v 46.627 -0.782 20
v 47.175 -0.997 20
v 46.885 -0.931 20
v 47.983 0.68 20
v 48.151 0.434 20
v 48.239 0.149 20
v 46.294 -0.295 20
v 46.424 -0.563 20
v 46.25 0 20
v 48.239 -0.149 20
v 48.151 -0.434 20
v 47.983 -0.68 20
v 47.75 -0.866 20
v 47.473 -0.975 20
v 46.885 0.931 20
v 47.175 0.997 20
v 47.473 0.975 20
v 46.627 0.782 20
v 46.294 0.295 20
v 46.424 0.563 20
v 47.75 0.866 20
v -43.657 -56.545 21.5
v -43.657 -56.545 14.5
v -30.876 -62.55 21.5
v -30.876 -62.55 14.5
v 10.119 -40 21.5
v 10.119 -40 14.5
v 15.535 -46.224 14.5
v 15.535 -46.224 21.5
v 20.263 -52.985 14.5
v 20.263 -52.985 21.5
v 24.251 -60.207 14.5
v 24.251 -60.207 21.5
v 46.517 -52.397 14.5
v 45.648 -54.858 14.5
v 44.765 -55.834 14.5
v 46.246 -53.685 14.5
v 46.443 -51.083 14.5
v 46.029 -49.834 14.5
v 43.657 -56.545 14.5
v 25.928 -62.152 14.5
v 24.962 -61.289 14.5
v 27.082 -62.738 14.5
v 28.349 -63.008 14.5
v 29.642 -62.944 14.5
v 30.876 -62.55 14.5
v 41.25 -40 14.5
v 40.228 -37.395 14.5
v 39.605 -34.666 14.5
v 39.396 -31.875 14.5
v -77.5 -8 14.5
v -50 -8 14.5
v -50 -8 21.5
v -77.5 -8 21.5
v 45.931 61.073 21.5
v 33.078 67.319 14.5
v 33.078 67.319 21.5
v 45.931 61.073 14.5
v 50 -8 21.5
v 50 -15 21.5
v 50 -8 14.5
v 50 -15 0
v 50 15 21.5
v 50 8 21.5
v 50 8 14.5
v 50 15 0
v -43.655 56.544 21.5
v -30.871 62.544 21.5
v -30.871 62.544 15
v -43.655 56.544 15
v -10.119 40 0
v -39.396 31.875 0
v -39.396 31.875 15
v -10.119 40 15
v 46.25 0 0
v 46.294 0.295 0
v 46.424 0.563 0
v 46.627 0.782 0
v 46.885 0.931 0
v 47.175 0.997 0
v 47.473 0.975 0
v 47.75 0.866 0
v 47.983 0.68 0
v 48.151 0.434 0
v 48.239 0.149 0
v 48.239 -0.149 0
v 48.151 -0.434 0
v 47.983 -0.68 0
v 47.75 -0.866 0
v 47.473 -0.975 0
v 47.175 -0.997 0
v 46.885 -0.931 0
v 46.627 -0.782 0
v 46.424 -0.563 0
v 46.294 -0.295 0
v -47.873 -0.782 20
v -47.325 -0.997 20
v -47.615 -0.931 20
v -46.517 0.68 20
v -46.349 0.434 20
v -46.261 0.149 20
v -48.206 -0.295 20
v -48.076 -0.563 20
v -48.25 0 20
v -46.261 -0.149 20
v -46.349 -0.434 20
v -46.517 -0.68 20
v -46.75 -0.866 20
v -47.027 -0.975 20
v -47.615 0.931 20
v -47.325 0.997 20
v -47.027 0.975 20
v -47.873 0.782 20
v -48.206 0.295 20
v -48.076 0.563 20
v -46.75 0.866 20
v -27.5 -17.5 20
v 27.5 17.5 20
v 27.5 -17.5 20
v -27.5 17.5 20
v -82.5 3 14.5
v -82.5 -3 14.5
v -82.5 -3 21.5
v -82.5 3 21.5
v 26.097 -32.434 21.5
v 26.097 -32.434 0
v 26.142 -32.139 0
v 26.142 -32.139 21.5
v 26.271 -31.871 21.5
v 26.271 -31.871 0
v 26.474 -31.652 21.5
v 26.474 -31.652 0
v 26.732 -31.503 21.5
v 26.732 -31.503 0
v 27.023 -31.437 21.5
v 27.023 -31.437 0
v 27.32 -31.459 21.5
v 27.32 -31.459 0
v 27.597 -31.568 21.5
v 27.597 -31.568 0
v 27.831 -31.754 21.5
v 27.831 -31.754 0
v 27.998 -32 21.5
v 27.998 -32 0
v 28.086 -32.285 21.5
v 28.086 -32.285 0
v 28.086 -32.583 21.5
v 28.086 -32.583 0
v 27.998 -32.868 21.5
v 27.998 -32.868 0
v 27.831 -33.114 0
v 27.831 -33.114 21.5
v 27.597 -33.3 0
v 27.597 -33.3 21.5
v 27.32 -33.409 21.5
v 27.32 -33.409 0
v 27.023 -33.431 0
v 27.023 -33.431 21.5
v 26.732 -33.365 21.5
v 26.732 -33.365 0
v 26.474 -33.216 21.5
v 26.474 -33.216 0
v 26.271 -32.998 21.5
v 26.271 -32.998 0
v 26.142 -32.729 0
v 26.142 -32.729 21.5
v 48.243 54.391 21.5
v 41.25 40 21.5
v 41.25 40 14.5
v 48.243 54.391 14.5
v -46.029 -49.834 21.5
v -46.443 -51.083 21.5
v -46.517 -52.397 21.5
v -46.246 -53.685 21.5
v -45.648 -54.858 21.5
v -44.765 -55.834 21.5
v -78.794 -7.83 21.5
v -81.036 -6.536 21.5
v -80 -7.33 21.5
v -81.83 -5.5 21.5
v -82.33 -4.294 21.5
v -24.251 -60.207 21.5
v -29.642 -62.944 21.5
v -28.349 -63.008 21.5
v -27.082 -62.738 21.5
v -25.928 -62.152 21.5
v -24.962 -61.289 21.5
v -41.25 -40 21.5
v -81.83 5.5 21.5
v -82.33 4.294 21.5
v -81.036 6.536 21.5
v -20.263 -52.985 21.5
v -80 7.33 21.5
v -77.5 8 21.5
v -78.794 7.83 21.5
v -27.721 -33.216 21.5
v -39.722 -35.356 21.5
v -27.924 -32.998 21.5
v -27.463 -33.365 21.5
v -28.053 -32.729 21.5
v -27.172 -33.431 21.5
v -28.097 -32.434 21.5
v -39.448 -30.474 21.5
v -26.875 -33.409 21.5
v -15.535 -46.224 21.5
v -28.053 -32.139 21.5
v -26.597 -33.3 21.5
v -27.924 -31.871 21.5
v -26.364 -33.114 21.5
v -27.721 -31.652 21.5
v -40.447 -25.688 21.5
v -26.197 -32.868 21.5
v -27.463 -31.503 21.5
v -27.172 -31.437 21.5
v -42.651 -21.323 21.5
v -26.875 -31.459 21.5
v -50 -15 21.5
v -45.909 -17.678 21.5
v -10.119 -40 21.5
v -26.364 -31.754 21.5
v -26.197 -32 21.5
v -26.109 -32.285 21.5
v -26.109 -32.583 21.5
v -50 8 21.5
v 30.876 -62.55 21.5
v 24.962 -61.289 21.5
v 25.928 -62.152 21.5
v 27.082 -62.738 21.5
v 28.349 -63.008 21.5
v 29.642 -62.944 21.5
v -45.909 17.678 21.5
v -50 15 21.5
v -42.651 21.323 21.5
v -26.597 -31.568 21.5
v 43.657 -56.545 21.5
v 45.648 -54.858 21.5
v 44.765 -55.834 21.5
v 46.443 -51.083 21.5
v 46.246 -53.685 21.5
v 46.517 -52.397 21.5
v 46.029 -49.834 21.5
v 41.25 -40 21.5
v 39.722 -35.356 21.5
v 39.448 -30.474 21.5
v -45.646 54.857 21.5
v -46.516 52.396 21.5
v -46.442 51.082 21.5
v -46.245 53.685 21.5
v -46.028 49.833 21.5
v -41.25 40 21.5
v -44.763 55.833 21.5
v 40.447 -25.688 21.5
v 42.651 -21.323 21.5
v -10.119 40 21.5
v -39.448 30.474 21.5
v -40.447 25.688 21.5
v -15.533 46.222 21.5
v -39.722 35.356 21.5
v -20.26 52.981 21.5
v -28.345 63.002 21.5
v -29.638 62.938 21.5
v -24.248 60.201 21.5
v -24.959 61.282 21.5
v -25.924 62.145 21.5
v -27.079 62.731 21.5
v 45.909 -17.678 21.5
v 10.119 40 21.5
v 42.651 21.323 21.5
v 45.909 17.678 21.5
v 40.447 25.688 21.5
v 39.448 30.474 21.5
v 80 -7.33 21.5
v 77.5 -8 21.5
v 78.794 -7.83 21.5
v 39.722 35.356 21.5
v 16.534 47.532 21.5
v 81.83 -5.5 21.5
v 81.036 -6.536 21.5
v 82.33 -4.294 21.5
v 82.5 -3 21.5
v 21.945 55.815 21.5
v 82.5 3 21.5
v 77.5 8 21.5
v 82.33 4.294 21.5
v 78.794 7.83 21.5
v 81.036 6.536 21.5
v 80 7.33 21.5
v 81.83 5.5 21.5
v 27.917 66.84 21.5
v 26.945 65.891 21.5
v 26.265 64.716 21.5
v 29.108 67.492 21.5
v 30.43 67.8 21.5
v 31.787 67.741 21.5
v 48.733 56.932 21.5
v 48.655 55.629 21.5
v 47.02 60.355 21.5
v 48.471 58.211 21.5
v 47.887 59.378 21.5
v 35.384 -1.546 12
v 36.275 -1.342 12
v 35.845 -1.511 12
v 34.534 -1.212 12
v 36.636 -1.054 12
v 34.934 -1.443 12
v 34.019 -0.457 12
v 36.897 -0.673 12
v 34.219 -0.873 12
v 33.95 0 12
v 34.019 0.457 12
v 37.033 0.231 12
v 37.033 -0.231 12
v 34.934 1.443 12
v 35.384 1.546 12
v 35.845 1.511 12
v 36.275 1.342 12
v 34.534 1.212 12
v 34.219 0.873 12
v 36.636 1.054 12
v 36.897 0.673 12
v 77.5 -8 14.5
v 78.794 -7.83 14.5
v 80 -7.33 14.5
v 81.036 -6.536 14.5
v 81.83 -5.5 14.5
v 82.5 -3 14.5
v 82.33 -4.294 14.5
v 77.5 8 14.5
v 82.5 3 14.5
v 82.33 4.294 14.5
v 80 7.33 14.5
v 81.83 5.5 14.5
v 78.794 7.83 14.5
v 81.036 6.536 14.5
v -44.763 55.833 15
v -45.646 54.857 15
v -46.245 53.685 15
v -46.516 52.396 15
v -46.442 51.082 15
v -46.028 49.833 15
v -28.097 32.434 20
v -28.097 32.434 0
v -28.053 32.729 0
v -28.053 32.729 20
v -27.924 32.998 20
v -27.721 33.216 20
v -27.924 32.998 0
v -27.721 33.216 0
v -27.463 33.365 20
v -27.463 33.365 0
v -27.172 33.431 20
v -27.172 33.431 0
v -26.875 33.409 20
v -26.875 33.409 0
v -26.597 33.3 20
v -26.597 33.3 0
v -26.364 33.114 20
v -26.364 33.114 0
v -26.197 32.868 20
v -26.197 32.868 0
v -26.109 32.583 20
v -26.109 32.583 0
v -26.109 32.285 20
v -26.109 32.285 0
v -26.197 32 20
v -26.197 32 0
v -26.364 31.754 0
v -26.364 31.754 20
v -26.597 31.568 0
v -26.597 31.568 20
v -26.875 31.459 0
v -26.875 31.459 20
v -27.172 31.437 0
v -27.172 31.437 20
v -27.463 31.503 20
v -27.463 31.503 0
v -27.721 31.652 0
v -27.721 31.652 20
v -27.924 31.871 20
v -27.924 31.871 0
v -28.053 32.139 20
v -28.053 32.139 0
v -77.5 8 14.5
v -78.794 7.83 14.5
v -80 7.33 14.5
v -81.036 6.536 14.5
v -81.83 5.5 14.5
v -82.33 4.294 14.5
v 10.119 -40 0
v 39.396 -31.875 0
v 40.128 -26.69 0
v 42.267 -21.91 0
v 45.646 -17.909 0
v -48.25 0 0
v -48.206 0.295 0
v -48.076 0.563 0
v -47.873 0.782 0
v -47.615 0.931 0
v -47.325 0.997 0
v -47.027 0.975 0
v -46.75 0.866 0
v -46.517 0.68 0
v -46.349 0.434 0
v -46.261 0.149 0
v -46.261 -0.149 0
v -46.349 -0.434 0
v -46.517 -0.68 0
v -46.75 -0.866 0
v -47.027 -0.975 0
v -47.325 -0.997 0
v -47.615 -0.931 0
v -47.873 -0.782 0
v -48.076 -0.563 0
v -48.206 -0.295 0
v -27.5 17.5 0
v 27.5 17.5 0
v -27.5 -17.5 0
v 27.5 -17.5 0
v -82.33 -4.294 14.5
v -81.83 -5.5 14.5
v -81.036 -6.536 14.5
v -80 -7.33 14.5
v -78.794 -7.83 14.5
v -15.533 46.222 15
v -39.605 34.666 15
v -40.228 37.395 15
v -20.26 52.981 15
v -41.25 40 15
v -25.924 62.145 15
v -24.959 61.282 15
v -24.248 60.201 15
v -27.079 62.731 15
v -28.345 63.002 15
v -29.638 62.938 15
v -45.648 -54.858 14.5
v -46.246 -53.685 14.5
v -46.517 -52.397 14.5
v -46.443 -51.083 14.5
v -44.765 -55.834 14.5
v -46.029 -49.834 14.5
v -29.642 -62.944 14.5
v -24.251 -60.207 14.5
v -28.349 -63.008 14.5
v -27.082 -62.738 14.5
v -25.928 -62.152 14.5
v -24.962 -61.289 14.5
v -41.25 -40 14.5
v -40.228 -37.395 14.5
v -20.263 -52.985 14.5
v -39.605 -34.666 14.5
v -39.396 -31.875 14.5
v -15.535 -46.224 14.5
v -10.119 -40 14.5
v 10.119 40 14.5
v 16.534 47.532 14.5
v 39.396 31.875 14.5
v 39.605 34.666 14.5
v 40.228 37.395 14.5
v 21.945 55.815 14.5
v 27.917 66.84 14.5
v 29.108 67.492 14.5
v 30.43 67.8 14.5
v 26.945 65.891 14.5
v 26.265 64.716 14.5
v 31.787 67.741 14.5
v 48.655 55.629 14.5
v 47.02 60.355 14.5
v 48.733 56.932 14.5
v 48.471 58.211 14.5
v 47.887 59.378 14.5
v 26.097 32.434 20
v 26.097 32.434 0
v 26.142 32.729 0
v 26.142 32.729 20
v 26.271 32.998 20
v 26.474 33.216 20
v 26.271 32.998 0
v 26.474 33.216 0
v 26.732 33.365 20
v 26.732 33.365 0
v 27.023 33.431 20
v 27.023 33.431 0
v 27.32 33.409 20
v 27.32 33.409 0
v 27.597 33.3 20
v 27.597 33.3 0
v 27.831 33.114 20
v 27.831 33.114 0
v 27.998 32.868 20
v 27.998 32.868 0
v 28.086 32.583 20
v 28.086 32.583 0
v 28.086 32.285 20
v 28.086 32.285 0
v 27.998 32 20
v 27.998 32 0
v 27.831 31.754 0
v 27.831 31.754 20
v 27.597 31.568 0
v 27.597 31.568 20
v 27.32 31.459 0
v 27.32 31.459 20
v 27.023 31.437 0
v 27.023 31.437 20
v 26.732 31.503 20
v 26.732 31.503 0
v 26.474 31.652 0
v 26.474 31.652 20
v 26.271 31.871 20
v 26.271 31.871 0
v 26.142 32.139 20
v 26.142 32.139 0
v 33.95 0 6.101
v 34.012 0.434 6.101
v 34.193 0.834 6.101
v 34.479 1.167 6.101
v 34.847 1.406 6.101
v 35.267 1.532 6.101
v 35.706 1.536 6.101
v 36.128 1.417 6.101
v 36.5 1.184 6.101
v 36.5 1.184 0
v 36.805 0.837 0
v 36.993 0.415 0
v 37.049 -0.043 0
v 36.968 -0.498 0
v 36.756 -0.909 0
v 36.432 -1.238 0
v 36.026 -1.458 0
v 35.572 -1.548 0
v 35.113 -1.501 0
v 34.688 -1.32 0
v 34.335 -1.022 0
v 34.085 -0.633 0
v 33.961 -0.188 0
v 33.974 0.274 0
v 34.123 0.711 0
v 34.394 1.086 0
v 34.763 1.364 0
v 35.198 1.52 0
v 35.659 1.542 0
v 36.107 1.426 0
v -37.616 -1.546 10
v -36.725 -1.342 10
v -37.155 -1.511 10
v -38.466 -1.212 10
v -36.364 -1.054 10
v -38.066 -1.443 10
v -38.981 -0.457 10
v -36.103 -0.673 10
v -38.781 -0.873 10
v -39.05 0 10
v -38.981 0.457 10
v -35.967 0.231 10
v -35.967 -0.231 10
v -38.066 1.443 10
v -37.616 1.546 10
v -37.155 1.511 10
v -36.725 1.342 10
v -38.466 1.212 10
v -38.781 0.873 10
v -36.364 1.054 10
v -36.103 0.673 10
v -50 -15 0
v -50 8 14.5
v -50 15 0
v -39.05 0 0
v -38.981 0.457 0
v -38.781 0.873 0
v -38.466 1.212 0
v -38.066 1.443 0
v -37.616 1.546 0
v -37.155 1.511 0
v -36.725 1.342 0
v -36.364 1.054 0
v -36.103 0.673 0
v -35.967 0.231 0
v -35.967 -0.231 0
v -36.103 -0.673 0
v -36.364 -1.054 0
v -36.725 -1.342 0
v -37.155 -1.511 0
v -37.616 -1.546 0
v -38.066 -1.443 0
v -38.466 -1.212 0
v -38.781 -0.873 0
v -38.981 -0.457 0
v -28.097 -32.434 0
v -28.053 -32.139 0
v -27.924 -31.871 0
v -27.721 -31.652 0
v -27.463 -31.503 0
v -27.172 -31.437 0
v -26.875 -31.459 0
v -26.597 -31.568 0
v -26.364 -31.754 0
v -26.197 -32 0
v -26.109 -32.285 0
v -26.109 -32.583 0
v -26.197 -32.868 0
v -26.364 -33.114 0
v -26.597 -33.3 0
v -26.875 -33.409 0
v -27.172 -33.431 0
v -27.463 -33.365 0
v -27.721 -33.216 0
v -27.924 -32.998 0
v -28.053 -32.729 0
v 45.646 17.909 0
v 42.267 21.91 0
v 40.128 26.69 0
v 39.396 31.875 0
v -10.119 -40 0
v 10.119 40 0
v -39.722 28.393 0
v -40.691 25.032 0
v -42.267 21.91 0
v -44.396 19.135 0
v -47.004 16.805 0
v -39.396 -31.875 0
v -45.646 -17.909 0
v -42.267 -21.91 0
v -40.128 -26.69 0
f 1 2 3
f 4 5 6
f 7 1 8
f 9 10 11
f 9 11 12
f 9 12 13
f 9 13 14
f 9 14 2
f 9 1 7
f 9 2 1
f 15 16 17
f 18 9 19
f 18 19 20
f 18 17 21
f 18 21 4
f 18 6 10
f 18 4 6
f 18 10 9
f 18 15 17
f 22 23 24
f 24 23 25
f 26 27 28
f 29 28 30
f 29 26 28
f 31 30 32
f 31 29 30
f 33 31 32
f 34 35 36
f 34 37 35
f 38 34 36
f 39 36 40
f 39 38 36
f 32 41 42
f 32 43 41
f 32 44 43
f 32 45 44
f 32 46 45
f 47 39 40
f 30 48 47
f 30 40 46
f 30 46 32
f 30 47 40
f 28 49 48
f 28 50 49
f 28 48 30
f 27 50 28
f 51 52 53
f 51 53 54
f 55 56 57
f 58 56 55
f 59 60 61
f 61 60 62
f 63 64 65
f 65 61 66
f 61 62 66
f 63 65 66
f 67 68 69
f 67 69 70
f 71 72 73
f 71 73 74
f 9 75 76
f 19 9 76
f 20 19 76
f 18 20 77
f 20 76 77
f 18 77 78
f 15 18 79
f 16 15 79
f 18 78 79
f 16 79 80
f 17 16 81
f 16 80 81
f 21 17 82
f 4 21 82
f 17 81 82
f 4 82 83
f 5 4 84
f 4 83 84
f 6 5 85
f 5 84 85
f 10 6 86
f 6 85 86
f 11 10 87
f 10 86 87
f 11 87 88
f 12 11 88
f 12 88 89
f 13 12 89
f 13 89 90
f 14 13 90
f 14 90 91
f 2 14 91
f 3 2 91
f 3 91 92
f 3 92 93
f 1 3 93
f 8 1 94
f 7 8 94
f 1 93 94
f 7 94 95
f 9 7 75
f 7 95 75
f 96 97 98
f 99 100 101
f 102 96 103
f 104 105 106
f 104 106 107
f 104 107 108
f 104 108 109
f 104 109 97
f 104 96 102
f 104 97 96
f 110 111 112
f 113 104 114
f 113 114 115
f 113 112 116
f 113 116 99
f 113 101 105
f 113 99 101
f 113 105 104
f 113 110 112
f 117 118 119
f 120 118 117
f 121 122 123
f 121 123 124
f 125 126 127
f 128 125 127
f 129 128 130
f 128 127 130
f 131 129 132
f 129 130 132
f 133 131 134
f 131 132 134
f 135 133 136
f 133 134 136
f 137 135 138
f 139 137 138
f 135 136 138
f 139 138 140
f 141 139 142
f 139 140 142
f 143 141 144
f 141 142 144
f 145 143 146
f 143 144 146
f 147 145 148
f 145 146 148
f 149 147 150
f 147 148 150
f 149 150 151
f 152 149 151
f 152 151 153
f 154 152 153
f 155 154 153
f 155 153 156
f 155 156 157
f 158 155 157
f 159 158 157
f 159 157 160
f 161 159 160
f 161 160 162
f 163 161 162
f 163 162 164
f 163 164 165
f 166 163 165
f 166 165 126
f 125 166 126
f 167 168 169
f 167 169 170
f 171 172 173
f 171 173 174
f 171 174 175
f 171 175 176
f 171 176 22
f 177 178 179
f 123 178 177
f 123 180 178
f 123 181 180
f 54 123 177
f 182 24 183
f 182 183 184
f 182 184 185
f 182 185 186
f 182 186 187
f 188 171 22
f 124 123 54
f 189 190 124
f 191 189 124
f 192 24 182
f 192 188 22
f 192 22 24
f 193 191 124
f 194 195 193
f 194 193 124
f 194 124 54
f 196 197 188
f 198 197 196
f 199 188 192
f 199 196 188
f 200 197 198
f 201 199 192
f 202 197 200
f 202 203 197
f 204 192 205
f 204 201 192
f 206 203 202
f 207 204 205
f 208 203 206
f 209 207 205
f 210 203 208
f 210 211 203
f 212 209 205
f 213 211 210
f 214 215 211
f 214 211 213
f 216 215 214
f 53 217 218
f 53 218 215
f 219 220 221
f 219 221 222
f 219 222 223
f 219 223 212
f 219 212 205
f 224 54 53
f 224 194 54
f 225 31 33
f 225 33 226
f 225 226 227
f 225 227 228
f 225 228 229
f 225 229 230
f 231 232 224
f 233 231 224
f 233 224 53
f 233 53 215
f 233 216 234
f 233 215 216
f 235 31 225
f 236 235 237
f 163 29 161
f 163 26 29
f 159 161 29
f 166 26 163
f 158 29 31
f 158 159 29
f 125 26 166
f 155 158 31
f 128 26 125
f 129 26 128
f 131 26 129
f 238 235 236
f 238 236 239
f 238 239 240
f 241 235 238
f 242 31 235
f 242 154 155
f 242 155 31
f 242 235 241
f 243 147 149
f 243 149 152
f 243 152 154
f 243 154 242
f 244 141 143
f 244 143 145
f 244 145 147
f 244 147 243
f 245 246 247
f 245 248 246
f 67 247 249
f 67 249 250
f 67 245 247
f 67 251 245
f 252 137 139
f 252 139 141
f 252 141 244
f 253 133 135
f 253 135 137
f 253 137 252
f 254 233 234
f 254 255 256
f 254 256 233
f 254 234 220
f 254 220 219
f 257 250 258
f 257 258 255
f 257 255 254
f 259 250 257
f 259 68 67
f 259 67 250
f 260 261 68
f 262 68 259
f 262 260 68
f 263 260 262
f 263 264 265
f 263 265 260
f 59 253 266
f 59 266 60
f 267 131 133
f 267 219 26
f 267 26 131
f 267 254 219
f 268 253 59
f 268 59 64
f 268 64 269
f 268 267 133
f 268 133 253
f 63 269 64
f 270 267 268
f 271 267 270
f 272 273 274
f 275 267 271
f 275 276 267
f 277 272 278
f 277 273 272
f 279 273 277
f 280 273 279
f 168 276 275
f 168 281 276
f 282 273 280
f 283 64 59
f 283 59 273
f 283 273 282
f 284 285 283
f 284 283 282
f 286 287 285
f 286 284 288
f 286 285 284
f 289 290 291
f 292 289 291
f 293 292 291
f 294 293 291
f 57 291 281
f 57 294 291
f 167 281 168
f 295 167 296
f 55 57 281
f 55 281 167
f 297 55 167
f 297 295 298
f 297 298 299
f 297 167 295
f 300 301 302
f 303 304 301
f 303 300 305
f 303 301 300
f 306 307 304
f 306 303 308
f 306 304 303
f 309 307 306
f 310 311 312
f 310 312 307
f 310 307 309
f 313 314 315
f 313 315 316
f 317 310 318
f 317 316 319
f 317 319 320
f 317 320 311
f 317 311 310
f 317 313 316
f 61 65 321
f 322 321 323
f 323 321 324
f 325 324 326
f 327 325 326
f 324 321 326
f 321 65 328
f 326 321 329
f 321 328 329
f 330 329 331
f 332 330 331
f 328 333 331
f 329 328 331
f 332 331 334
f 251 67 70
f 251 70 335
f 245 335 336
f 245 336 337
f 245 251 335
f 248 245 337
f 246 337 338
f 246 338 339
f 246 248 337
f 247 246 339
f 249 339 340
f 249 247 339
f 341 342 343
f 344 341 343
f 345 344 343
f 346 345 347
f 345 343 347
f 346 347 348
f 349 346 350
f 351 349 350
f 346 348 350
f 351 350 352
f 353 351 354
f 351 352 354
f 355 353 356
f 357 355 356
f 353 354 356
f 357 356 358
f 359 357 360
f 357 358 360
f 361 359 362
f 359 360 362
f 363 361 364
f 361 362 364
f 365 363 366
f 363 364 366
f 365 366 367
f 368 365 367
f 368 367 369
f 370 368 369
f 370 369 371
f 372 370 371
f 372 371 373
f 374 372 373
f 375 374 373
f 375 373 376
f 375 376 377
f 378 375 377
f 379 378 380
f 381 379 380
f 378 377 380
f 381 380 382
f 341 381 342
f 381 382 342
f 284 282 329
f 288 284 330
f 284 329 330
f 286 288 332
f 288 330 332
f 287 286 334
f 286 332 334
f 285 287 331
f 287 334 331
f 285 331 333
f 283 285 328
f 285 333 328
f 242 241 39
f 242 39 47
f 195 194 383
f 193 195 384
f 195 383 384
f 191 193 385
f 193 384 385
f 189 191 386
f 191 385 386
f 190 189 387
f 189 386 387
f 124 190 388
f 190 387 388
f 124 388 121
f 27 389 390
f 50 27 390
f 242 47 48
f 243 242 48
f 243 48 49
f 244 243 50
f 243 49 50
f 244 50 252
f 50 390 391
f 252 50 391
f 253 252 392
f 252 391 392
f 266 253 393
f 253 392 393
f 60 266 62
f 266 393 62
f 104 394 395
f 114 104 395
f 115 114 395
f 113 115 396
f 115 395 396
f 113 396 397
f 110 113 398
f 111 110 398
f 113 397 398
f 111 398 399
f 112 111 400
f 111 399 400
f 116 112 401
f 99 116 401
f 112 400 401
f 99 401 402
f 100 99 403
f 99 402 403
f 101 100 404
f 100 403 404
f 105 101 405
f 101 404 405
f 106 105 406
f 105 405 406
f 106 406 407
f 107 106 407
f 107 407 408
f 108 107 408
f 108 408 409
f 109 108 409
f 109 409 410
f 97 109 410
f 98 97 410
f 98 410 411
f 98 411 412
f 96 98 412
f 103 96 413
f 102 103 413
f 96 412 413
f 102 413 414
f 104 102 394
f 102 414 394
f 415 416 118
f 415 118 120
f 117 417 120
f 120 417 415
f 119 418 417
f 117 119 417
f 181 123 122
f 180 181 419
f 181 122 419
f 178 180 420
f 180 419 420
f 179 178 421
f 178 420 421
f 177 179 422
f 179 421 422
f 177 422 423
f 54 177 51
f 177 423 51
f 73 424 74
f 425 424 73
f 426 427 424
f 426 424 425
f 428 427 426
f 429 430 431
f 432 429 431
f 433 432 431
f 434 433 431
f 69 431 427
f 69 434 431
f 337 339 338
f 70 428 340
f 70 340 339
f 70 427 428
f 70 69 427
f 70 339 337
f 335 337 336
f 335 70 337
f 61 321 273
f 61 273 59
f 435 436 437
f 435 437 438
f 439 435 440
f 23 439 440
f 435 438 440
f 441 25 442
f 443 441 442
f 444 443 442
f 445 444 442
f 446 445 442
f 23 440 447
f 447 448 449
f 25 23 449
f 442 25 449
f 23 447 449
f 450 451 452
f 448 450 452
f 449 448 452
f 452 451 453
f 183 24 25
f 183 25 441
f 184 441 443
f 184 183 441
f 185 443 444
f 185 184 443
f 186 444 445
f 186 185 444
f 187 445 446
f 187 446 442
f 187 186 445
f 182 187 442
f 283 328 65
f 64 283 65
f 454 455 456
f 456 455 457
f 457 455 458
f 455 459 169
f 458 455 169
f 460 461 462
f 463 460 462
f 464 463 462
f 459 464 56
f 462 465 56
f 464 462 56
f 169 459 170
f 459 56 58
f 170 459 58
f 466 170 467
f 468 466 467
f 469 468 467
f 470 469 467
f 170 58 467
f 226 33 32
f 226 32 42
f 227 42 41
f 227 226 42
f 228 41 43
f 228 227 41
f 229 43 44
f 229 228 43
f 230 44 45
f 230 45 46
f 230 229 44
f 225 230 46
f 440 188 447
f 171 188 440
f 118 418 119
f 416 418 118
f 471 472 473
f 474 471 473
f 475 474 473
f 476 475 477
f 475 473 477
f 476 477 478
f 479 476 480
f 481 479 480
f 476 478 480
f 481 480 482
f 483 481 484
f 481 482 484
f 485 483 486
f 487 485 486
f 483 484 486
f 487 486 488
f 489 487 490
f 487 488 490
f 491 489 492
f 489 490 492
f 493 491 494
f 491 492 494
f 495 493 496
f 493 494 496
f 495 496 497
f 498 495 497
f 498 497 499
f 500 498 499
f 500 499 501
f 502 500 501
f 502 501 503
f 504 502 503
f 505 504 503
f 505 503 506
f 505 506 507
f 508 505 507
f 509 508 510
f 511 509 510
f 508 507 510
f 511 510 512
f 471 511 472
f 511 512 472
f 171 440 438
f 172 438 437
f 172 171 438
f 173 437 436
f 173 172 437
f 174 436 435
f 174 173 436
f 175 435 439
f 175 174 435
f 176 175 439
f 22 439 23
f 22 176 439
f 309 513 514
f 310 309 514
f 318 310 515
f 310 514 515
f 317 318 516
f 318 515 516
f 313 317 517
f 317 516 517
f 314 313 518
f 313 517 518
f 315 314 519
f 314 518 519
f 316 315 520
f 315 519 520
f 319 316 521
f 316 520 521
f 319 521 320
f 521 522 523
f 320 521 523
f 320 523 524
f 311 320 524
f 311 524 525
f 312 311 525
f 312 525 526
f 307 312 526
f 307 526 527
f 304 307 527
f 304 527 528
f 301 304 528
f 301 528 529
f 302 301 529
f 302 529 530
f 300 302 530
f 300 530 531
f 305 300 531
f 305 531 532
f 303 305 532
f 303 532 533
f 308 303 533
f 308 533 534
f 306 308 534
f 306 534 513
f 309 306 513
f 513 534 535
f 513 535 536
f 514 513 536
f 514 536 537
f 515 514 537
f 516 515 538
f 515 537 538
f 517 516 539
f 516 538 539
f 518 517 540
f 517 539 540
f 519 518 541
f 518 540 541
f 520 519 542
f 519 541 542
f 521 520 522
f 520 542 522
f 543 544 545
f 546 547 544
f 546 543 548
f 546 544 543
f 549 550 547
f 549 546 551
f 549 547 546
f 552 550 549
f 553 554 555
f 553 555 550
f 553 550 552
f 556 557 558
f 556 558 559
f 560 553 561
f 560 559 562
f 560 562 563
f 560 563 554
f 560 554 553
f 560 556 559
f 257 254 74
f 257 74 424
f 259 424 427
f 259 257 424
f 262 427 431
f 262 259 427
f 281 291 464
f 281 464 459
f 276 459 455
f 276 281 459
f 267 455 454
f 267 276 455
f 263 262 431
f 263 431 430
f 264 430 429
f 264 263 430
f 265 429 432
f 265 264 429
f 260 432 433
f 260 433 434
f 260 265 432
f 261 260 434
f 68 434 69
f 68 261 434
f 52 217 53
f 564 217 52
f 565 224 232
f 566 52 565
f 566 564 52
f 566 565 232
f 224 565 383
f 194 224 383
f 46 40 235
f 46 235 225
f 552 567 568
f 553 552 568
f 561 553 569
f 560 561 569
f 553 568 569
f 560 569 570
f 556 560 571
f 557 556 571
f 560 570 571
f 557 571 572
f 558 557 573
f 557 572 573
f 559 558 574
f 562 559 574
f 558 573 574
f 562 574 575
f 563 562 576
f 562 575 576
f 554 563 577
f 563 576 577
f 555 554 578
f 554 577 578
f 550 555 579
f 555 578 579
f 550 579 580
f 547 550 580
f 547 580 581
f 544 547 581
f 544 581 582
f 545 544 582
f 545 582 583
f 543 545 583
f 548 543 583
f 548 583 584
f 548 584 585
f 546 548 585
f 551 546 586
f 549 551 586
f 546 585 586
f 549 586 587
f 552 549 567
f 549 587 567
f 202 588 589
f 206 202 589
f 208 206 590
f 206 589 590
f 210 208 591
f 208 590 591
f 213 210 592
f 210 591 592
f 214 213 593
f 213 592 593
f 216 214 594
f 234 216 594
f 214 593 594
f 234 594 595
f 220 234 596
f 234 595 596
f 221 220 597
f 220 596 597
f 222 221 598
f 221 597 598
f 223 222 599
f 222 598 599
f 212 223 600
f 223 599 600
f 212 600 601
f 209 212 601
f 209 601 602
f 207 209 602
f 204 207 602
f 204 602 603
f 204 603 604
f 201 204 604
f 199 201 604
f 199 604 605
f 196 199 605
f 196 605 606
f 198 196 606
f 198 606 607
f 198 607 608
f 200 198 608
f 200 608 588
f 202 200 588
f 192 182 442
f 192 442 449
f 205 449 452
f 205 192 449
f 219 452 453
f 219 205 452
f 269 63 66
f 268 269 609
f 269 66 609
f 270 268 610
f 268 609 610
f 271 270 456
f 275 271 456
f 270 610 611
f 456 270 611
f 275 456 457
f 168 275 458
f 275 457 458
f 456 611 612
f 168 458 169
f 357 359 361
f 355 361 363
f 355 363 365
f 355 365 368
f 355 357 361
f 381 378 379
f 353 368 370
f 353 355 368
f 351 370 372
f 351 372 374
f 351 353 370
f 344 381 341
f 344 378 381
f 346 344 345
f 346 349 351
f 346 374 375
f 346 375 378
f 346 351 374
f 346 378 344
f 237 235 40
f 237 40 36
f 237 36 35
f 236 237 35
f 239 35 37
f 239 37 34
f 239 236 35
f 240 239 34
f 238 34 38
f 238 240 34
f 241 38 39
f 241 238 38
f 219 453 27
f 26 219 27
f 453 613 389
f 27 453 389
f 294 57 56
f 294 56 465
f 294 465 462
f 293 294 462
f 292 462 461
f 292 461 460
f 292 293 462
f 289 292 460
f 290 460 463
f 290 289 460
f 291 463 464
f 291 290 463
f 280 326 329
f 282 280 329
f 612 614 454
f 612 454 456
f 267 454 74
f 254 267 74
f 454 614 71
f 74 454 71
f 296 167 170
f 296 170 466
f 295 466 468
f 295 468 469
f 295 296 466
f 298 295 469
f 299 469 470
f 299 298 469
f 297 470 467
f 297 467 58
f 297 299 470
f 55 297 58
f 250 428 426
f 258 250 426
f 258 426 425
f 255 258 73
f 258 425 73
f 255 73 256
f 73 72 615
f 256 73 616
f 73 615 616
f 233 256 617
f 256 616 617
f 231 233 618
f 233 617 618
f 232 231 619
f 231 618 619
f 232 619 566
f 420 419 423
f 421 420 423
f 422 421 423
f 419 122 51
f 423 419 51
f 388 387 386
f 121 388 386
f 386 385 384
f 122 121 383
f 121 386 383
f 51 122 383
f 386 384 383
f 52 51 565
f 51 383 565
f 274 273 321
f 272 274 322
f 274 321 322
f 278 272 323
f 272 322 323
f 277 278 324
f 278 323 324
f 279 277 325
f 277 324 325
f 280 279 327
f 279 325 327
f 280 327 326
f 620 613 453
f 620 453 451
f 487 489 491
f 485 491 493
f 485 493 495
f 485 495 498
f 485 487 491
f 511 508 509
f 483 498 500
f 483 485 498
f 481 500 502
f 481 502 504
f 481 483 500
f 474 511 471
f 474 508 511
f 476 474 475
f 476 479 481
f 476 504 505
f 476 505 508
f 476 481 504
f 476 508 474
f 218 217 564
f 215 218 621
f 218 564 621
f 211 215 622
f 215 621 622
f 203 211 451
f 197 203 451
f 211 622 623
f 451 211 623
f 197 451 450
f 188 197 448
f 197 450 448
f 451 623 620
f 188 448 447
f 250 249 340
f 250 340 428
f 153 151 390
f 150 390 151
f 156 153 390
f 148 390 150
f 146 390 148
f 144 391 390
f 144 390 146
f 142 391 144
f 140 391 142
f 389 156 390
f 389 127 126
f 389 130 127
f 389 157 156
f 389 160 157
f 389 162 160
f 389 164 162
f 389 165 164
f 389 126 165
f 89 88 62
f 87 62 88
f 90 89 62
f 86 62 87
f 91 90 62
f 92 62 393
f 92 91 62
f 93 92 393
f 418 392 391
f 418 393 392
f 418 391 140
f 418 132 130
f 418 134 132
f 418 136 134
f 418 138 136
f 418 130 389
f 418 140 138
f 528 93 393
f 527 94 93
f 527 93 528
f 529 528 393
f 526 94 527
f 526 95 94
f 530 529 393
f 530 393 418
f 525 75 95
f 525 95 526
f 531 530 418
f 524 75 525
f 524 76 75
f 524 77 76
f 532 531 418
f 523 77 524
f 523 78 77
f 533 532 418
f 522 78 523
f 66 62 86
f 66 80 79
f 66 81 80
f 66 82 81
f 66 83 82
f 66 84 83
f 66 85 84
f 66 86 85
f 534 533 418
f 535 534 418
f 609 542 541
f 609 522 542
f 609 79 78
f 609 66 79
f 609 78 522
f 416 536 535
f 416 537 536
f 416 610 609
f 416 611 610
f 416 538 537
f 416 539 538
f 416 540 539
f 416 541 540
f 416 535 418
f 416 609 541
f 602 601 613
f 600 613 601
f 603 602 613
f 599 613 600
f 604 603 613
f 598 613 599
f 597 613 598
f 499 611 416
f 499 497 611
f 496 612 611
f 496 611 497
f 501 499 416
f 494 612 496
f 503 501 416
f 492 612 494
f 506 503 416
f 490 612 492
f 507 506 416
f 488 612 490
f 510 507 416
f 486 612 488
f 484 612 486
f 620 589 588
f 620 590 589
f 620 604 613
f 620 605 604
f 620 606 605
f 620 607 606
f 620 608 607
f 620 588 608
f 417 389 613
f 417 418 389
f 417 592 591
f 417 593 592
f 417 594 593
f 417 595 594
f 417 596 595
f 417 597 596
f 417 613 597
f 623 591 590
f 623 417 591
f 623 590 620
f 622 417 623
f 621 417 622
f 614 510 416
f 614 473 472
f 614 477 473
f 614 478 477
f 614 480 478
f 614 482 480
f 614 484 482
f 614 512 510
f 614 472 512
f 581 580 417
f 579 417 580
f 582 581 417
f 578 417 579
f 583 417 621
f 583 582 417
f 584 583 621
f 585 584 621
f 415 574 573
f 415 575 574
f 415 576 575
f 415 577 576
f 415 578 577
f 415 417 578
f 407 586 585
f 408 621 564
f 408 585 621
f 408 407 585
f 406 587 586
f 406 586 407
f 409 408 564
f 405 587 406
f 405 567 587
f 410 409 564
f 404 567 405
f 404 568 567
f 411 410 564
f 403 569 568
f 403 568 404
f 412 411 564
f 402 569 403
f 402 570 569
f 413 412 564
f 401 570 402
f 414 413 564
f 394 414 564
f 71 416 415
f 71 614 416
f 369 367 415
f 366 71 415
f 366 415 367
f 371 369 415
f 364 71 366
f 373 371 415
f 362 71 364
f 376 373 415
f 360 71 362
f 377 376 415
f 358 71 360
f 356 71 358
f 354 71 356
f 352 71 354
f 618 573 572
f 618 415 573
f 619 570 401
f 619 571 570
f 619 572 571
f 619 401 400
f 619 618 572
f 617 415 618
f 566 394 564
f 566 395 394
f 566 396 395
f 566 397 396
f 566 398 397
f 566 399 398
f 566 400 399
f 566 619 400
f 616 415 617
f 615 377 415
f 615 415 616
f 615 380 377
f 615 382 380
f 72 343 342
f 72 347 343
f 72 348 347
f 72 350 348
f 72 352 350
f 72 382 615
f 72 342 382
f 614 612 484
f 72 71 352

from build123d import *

# Parameters (mm, degrees)
SKETCH_1_W           = 65
SKETCH_1_H           = 25
SKETCH_1_W_2         = 17.5
SKETCH_1_H_2         = 30
EXTRUDE_1_DEPTH      = 21.5
SKETCH_2_W           = 37.5
SKETCH_2_H           = 30
EXTRUDE_2_DEPTH      = 7
CUT_EXTRUDE_21_DEPTH = 15
CUT_EXTRUDE_23_DEPTH = 14.5
CUT_EXTRUDE_24_DEPTH = 14.5
CUT_EXTRUDE_25_DEPTH = 14.5
CUT_EXTRUDE_27_DEPTH = 14.5
CUT_EXTRUDE_28_DEPTH = 0.5
CUT_EXTRUDE_START    = -10
CUT_EXTRUDE_32_DEPTH = 10
SKETCH_14_W          = 37.5
SKETCH_14_H          = 7
CUT_EXTRUDE_33_DEPTH = 10
SKETCH_15_R          = 1
CUT_EXTRUDE_34_DEPTH = 30
EXTRUDE_3_DEPTH      = 20
SKETCH_18_R          = 1
CUT_EXTRUDE_35_DEPTH = 20
SKETCH_19_R          = 1
CUT_EXTRUDE_36_DEPTH = 20
SKETCH_20_W          = 55
SKETCH_20_H          = 35
CUT_EXTRUDE_37_DEPTH = 20
SKETCH_21_W          = 35.200875269
SKETCH_21_H          = 10.973883626
CUT_EXTRUDE_38_DEPTH = 26
SKETCH_25_W          = 4.333842745
SKETCH_25_H          = 3.588286738
CUT_EXTRUDE_41_DEPTH = 26
CUT_EXTRUDE_42_DEPTH = 23
SKETCH_29_W          = 5
SKETCH_29_H          = 16
CUT_EXTRUDE_43_DEPTH = 23
SKETCH_30_R          = 1.55
CUT_EXTRUDE_44_DEPTH = 10
SKETCH_31_R          = 1.55
CUT_EXTRUDE_45_DEPTH = 6.100799321
SKETCH_32_R          = 1.55
EXTRUDE_4_DEPTH      = 15
SKETCH_33_R          = 1.55
CUT_EXTRUDE_46_DEPTH = 12
CUT_EXTRUDE_49_DEPTH = 10
CUT_EXTRUDE_50_DEPTH = 25
CUT_EXTRUDE_START_2  = -25
CUT_EXTRUDE_51_DEPTH = 25
CUT_EXTRUDE_52_DEPTH = 25
CUT_EXTRUDE_55_DEPTH = 25
CUT_EXTRUDE_56_DEPTH = 25
CUT_EXTRUDE_59_DEPTH = 25
CUT_EXTRUDE_60_DEPTH = 25
CUT_EXTRUDE_61_DEPTH = 25
CUT_EXTRUDE_62_DEPTH = 25
CUT_EXTRUDE_63_DEPTH = 25


with BuildPart() as part:
    # 草图1 → 凸台-拉伸1 (new body)
    with BuildSketch(Plane.XY):
        with Locations((0, 27.5)):
            Rectangle(SKETCH_1_W, SKETCH_1_H)
        with BuildLine():
            ThreePointArc((-41.25, 40), (-40.44733047, 25.687815665), (-50, 15))
            Line((-50, 15), (-32.5, 15))
            Line((-32.5, 15), (-32.5, 40))
            Line((-32.5, 40), (-41.25, 40))
        make_face()
        with BuildLine():
            Line((32.5, 40), (32.5, 15))
            Line((32.5, 15), (50, 15))
            ThreePointArc((50, 15), (40.44733047, 25.687815665), (41.25, 40))
            Line((41.25, 40), (32.5, 40))
        make_face()
        with Locations((41.25, 0)):
            Rectangle(SKETCH_1_W_2, SKETCH_1_H_2)
        Rectangle(SKETCH_1_W, SKETCH_1_H_2)
        with Locations((-41.25, 0)):
            Rectangle(SKETCH_1_W_2, SKETCH_1_H_2)
        with BuildLine():
            ThreePointArc((-50, -15), (-40.44733047, -25.687815665), (-41.25, -40))
            Line((-41.25, -40), (-32.5, -40))
            Line((-32.5, -40), (-32.5, -15))
            Line((-32.5, -15), (-50, -15))
        make_face()
        with Locations((0, -27.5)):
            Rectangle(SKETCH_1_W, SKETCH_1_H)
        with BuildLine():
            Line((32.5, -15), (32.5, -40))
            Line((32.5, -40), (41.25, -40))
            ThreePointArc((41.25, -40), (40.44733047, -25.687815665), (50, -15))
            Line((50, -15), (32.5, -15))
        make_face()
    extrude(amount=EXTRUDE_1_DEPTH)

    # 草图2 → 凸台-拉伸2 (add)
    with BuildSketch(Plane.XY.offset(21.5)):
        with Locations((68.75, 0)):
            Rectangle(SKETCH_2_W, SKETCH_2_H)
        with BuildLine():
            ThreePointArc((31.362634986, 83.717731106), (24.230066028, 60.16346689), (10.119378388, 40))
            Line((10.119378388, 40), (41.25, 40))
            Line((41.25, 40), (56.546841385, 71.480257998))
            Line((56.546841385, 71.480257998), (31.362634986, 83.717731106))
        make_face()
        with BuildLine():
            Line((-56.546841385, 71.480257998), (-41.25, 40))
            Line((-41.25, 40), (-10.119378388, 40))
            ThreePointArc((-10.119378388, 40), (-24.230066028, 60.16346689), (-31.362634986, 83.717731106))
            Line((-31.362634986, 83.717731106), (-56.546841385, 71.480257998))
        make_face()
        with Locations((-68.75, 0)):
            Rectangle(SKETCH_2_W, SKETCH_2_H)
        with BuildLine():
            ThreePointArc((-31.362634986, -83.717731106), (-24.230066028, -60.16346689), (-10.119378388, -40))
            Line((-10.119378388, -40), (-41.25, -40))
            Line((-41.25, -40), (-56.546841385, -71.480257998))
            Line((-56.546841385, -71.480257998), (-31.362634986, -83.717731106))
        make_face()
        with BuildLine():
            Line((41.25, -40), (10.119378388, -40))
            ThreePointArc((10.119378388, -40), (24.230066028, -60.16346689), (31.362634986, -83.717731106))
            Line((31.362634986, -83.717731106), (56.546841385, -71.480257998))
            Line((56.546841385, -71.480257998), (41.25, -40))
        make_face()
    extrude(amount=-EXTRUDE_2_DEPTH)

    # 草图6 → 切除-拉伸21 (cut)
    with BuildSketch(Plane(origin=(0, 0, 0), x_dir=(-1, 0, 0), z_dir=(0, 0, -1))):
        Polygon((10.119378388, 40), (39.39584492, 31.875), (56.837191822, 38.348903147), (0, 62.639769561), align=None)
    extrude(amount=-CUT_EXTRUDE_21_DEPTH, mode=Mode.SUBTRACT)

    # 草图7 → 切除-拉伸23 (cut)
    with BuildSketch(Plane(origin=(0, 0, 0), x_dir=(-1, 0, 0), z_dir=(0, 0, -1))):
        Polygon((-10.119378388, -40), (-39.39584492, -31.875), (-53.358394545, -39.771171687), (-19.086589639, -55.987329608), align=None)
    extrude(amount=-CUT_EXTRUDE_23_DEPTH, mode=Mode.SUBTRACT)

    # 草图9 → 切除-拉伸24 (cut)
    with BuildSketch(Plane(origin=(0, 0, 0), x_dir=(-1, 0, 0), z_dir=(0, 0, -1))):
        Polygon((-10.119378388, 40), (-39.39584492, 31.875), (-58.125, 43.883609099), (-7.923028206, 48.831046035), align=None)
    extrude(amount=-CUT_EXTRUDE_24_DEPTH, mode=Mode.SUBTRACT)

    # 草图10 → 切除-拉伸25 (cut)
    with BuildSketch(Plane(origin=(0, 0, 0), x_dir=(-1, 0, 0), z_dir=(0, 0, -1))):
        Polygon((10.119378388, 40), (42.266947865, 21.909889239), (59.804647536, 30.954944619), (0, 68.202746977), align=None)
    extrude(amount=-CUT_EXTRUDE_25_DEPTH, mode=Mode.SUBTRACT)

    # 草图11 → 切除-拉伸27 (cut)
    with BuildSketch(Plane(origin=(0, 0, 0), x_dir=(-1, 0, 0), z_dir=(0, 0, -1))):
        Polygon((10.119378388, -40), (39.39584492, -31.875), (61.586062569, -40), (5.344245099, -59.295671812), align=None)
    extrude(amount=-CUT_EXTRUDE_27_DEPTH, mode=Mode.SUBTRACT)

    # 草图12 → 切除-拉伸28 (cut)
    with BuildSketch(Plane(origin=(0, 0, 14.5), x_dir=(-1, 0, 0), z_dir=(0, 0, -1))):
        Polygon((10.119378388, 40), (42.266947865, 21.909889239), (51.083391038, 30.954944619), (39.39584492, 31.875), align=None)
    extrude(amount=-CUT_EXTRUDE_28_DEPTH, mode=Mode.SUBTRACT)

    # 草图13 → 切除-拉伸32 (cut)
    with BuildSketch(Plane(origin=(0, 0, 14.5), x_dir=(-1, 0, 0), z_dir=(0, 0, -1)).offset(CUT_EXTRUDE_START)):
        Polygon((10.58865897, 82.694112306), (52.176315275, 62.48589857), (56.546841385, 71.480257998), (17.786028214, 90.314856211), align=None)
        Polygon((-14.643214372, 80.723928615), (-19.490898913, 89.48642791), (-56.546841385, 71.480257998), (-52.176315275, 62.48589857), align=None)
        Polygon((-52.176315275, -62.48589857), (-56.546841385, -71.480257998), (-18.055185597, -90.184067645), (-12.656512081, -81.689304116), align=None)
        with BuildLine():
            Line((31.362634986, -83.717731106), (56.546841385, -71.480257998))
            Line((56.546841385, -71.480257998), (52.176315275, -62.48589857))
            Line((52.176315275, -62.48589857), (29.292654399, -73.605493929))
            ThreePointArc((29.292654399, -73.605493929), (30.494954113, -78.627364186), (31.362634986, -83.717731106))
        make_face()
    extrude(amount=CUT_EXTRUDE_32_DEPTH, mode=Mode.SUBTRACT)

    # 草图14 → 切除-拉伸33 (cut)
    with BuildSketch(Plane(origin=(0, 0, 14.5), x_dir=(-1, 0, 0), z_dir=(0, 0, -1))):
        with Locations((68.75, -11.5)):
            Rectangle(SKETCH_14_W, SKETCH_14_H)
        with Locations((-68.75, -11.5)):
            Rectangle(SKETCH_14_W, SKETCH_14_H)
        with Locations((68.75, 11.5)):
            Rectangle(SKETCH_14_W, SKETCH_14_H)
        with Locations((-68.75, 11.5)):
            Rectangle(SKETCH_14_W, SKETCH_14_H)
    extrude(amount=-CUT_EXTRUDE_33_DEPTH, mode=Mode.SUBTRACT)

    # 草图15 → 切除-拉伸34 (cut)
    with BuildSketch(Plane(origin=(0, 0, 0), x_dir=(-1, 0, 0), z_dir=(0, 0, -1))):
        with Locations((-27.097478675, -32.434184843)):
            Circle(SKETCH_15_R)
        with Locations((27.097478675, -32.434184843)):
            Circle(SKETCH_15_R)
    extrude(amount=-CUT_EXTRUDE_34_DEPTH, mode=Mode.SUBTRACT)

    # 草图17 → 凸台-拉伸3 (add)
    with BuildSketch(Plane(origin=(0, 0, 0), x_dir=(-1, 0, 0), z_dir=(0, 0, -1))):
        with BuildLine():
            ThreePointArc((42.266947865, 21.909889239), (40.127928465, 26.6897646), (39.39584492, 31.875))
            Line((39.39584492, 31.875), (10.119378388, 40))
            Line((10.119378388, 40), (42.266947865, 21.909889239))
        make_face()
    extrude(amount=-EXTRUDE_3_DEPTH)

    # 草图18 → 切除-拉伸35 (cut)
    with BuildSketch(Plane(origin=(0, 0, 0), x_dir=(-1, 0, 0), z_dir=(0, 0, -1))):
        with Locations((-27.097478675, 32.434184843)):
            Circle(SKETCH_18_R)
        with Locations((27.097478675, 32.434184843)):
            Circle(SKETCH_18_R)
    extrude(amount=-CUT_EXTRUDE_35_DEPTH, mode=Mode.SUBTRACT)

    # 草图19 → 切除-拉伸36 (cut)
    with BuildSketch(Plane(origin=(0, 0, 0), x_dir=(-1, 0, 0), z_dir=(0, 0, -1))):
        with Locations((-47.25, 0)):
            Circle(SKETCH_19_R)
        with Locations((47.25, 0)):
            Circle(SKETCH_19_R)
    extrude(amount=-CUT_EXTRUDE_36_DEPTH, mode=Mode.SUBTRACT)

    # 草图20 → 切除-拉伸37 (cut)
    with BuildSketch(Plane(origin=(0, 0, 0), x_dir=(-1, 0, 0), z_dir=(0, 0, -1))):
        Rectangle(SKETCH_20_W, SKETCH_20_H)
    extrude(amount=-CUT_EXTRUDE_37_DEPTH, mode=Mode.SUBTRACT)

    # 草图21 → 切除-拉伸38 (cut)
    with BuildSketch(Plane(origin=(-22.636232033, 52.965581396, 0), x_dir=(0.9195424781856313, 0.39299062433120197, 0), z_dir=(0.3929906243312019, -0.9195424781856312, 0))):
        with Locations((-4.83440857, 9.513058187)):
            Rectangle(SKETCH_21_W, SKETCH_21_H)
    extrude(amount=-CUT_EXTRUDE_38_DEPTH, mode=Mode.SUBTRACT)

    # 草图25 → 切除-拉伸41 (cut)
    with BuildSketch(Plane(origin=(-34.529716487, 71.060708302, 0), x_dir=(0.8994359428084866, 0.4370526110026218, 0), z_dir=(-0.4370526110026218, 0.8994359428084866, 0))):
        with Locations((-20.7982707, -13.205856631)):
            Rectangle(SKETCH_25_W, SKETCH_25_H)
    extrude(amount=-CUT_EXTRUDE_41_DEPTH, mode=Mode.SUBTRACT)

    # 草图28 → 切除-拉伸42 (cut)
    with BuildSketch(Plane(origin=(0, 0, 14.5), x_dir=(-1, 0, 0), z_dir=(0, 0, -1))):
        Polygon((52.176315275, -66.088986914), (50.428104831, -62.491243143), (15.200632854, -79.608925319), (16.948843298, -83.20666909), align=None)
        Polygon((56.312132831, -59.632084777), (58.060343275, -63.229828548), (52.176315275, -66.088986914), (50.428104831, -62.491243143), align=None)
        Polygon((-52.176315275, -66.088986914), (-50.428104831, -62.491243143), (-15.200632854, -79.608925319), (-16.948843298, -83.20666909), align=None)
        Polygon((-50.428104831, -62.491243143), (-58.790509719, -58.427795468), (-60.538720163, -62.025539239), (-52.176315275, -66.088986914), align=None)
        Polygon((-16.948843298, 79.603580746), (-15.200632854, 76.005836975), (-50.428104831, 58.888154799), (-52.176315275, 62.48589857), align=None)
        Polygon((52.176315275, 62.48589857), (50.428104831, 58.888154799), (15.200632854, 76.005836975), (16.948843298, 79.603580746), align=None)
    extrude(amount=-CUT_EXTRUDE_42_DEPTH, mode=Mode.SUBTRACT)

    # 草图29 → 切除-拉伸43 (cut)
    with BuildSketch(Plane(origin=(0, 0, 14.5), x_dir=(-1, 0, 0), z_dir=(0, 0, -1))):
        with Locations((-85, 0)):
            Rectangle(SKETCH_29_W, SKETCH_29_H)
        with Locations((85, 0)):
            Rectangle(SKETCH_29_W, SKETCH_29_H)
    extrude(amount=-CUT_EXTRUDE_43_DEPTH, mode=Mode.SUBTRACT)

    # 草图30 → 切除-拉伸44 (cut)
    with BuildSketch(Plane(origin=(0, 0, 0), x_dir=(-1, 0, 0), z_dir=(0, 0, -1))):
        with Locations((-37.5, 0)):
            Circle(SKETCH_30_R)
        with Locations((37.5, 0)):
            Circle(SKETCH_30_R)
    extrude(amount=-CUT_EXTRUDE_44_DEPTH, mode=Mode.SUBTRACT)

    # 草图31 → 切除-拉伸45 (cut)
    with BuildSketch(Plane(origin=(0, 0, 0), x_dir=(-1, 0, 0), z_dir=(0, 0, -1))):
        with Locations((-35.5, 0)):
            Circle(SKETCH_31_R)
    extrude(amount=-CUT_EXTRUDE_45_DEPTH, mode=Mode.SUBTRACT)

    # 草图32 → 凸台-拉伸4 (add)
    with BuildSketch(Plane(origin=(0, 0, 0), x_dir=(-1, 0, 0), z_dir=(0, 0, -1))):
        with Locations((-37.5, 0)):
            Circle(SKETCH_32_R)
    extrude(amount=-EXTRUDE_4_DEPTH)

    # 草图33 → 切除-拉伸46 (cut)
    with BuildSketch(Plane(origin=(0, 0, 0), x_dir=(-1, 0, 0), z_dir=(0, 0, -1))):
        with Locations((-35.5, 0)):
            Circle(SKETCH_33_R)
    extrude(amount=-CUT_EXTRUDE_46_DEPTH, mode=Mode.SUBTRACT)

    # 草图34 → 切除-拉伸49 (cut)
    with BuildSketch(Plane(origin=(0, 0, 14.5), x_dir=(-1, 0, 0), z_dir=(0, 0, -1))):
        with BuildLine():
            ThreePointArc((-77.5, -8), (-81.035533906, -6.535533906), (-82.5, -3))
            Line((-82.5, -3), (-82.5, -8))
            Line((-82.5, -8), (-77.5, -8))
        make_face()
        with BuildLine():
            Line((-82.5, 8), (-82.5, 3))
            ThreePointArc((-82.5, 3), (-81.035533906, 6.535533906), (-77.5, 8))
            Line((-77.5, 8), (-82.5, 8))
        make_face()
    extrude(amount=-CUT_EXTRUDE_49_DEPTH, mode=Mode.SUBTRACT)

    # 草图35 → 切除-拉伸50 (cut)
    with BuildSketch(Plane(origin=(0, 0, 14.5), x_dir=(-1, 0, 0), z_dir=(0, 0, -1))):
        with BuildLine():
            ThreePointArc((77.5, 8), (81.035533906, 6.535533906), (82.5, 3))
            Line((82.5, 3), (82.5, 8))
            Line((82.5, 8), (77.5, 8))
        make_face()
        with BuildLine():
            Line((82.5, -8), (82.5, -3))
            ThreePointArc((82.5, -3), (81.035533906, -6.535533906), (77.5, -8))
            Line((77.5, -8), (82.5, -8))
        make_face()
    extrude(amount=-CUT_EXTRUDE_50_DEPTH, mode=Mode.SUBTRACT)

    # 草图36 → 切除-拉伸51 (cut)
    with BuildSketch(Plane(origin=(0, 0, 14.5), x_dir=(-1, 0, 0), z_dir=(0, 0, -1)).offset(CUT_EXTRUDE_START_2)):
        with BuildLine():
            Line((-39.504333919, 72.905748912), (-33.07774272, 67.319017634))
            Line((-33.07774272, 67.319017634), (-28.118790882, 69.728664331))
            ThreePointArc((-28.118790882, 69.728664331), (-27.234796071, 67.206239647), (-26.264970905, 64.715554549))
            Line((-26.264970905, 64.715554549), (-25.306223542, 81.095943274))
            Line((-25.306223542, 81.095943274), (-42.89977916, 80.277638362))
            Line((-42.89977916, 80.277638362), (-39.504333919, 72.905748912))
        make_face()
        with BuildLine():
            ThreePointArc((33.07774272, 67.319017634), (29.107641849, 67.49242182), (26.264970905, 64.715554549))
            Line((26.264970905, 64.715554549), (17.767775768, 67.655318894))
            Line((17.767775768, 67.655318894), (26.848615448, 84.035744568))
            Line((26.848615448, 84.035744568), (28.820085623, 82.942817867))
            Line((28.820085623, 82.942817867), (36.635790353, 76.148509543))
            Line((36.635790353, 76.148509543), (33.07774272, 67.319017634))
        make_face()
        with BuildLine():
            ThreePointArc((48.242841776, 54.390975085), (48.470862659, 58.211010087), (45.930925117, 61.073417854))
            Line((45.930925117, 61.073417854), (49.061020363, 72.905748912))
            Line((49.061020363, 72.905748912), (54.994649752, 67.747556664))
            Line((54.994649752, 67.747556664), (55.514245962, 56.57623814))
            Line((55.514245962, 56.57623814), (53.680238507, 49.643355378))
            Line((53.680238507, 49.643355378), (48.242841776, 54.390975085))
        make_face()
        Polygon((-50.428104831, 58.888154799), (-45.930925117, 61.073417854), (-63.983419753, 67.319017634), (-64.704769924, 65.234002496), (-70.71583432, 54.390975085), (-54.957172435, 54.390975085), (-48.242841776, 54.390975085), align=None)
        with BuildLine():
            ThreePointArc((-33.07774272, -67.319017634), (-29.107641849, -67.49242182), (-26.264970905, -64.715554549))
            Line((-26.264970905, -64.715554549), (-14.718652678, -84.390540589))
            Line((-14.718652678, -84.390540589), (-54.027273861, -84.390540589))
            Line((-54.027273861, -84.390540589), (-58.903907316, -66.214912835))
            Line((-58.903907316, -66.214912835), (-58.903907316, -48.480785147))
            Line((-58.903907316, -48.480785147), (-48.242841776, -54.390975085))
            ThreePointArc((-48.242841776, -54.390975085), (-48.470862659, -58.211010087), (-45.930925117, -61.073417854))
            Line((-45.930925117, -61.073417854), (-33.07774272, -67.319017634))
        make_face()
        with BuildLine():
            Line((58.121394099, -59.411456741), (48.242841776, -54.390975085))
            ThreePointArc((48.242841776, -54.390975085), (48.470862659, -58.211010087), (45.930925117, -61.073417854))
            Line((45.930925117, -61.073417854), (33.07774272, -67.319017634))
            ThreePointArc((33.07774272, -67.319017634), (29.107641849, -67.49242182), (26.264970905, -64.715554549))
            Line((26.264970905, -64.715554549), (16.254972156, -74.725553298))
            Line((16.254972156, -74.725553298), (33.07774272, -82.900049612))
            Line((33.07774272, -82.900049612), (53.413827114, -73.018368929))
            Line((53.413827114, -73.018368929), (58.121394099, -59.411456741))
        make_face()
    extrude(amount=CUT_EXTRUDE_51_DEPTH, mode=Mode.SUBTRACT)

    # 草图37 → 切除-拉伸52 (cut)
    with BuildSketch(Plane(origin=(0, 0, 14.5), x_dir=(-1, 0, 0), z_dir=(0, 0, -1)).offset(CUT_EXTRUDE_START_2)):
        Polygon((-50.428104831, -58.888154799), (-49.456267727, -56.888154799), (-21.56050538, -70.443223247), (-22.532342484, -72.443223247), align=None)
        Polygon((50.428104831, -58.888154799), (49.456267727, -56.888154799), (21.56050538, -70.443223247), (22.532342484, -72.443223247), align=None)
        Polygon((50.428104831, 58.888154799), (49.456267727, 56.888154799), (21.56050538, 70.443223247), (22.532342484, 72.443223247), align=None)
        with BuildLine():
            Line((-22.532342484, 72.443223247), (-28.118790882, 69.728664331))
            ThreePointArc((-28.118790882, 69.728664331), (-27.759024767, 68.668415535), (-27.384090311, 67.61343529))
            Line((-27.384090311, 67.61343529), (-21.56050538, 70.443223247))
            Line((-21.56050538, 70.443223247), (-22.532342484, 72.443223247))
        make_face()
    extrude(amount=CUT_EXTRUDE_52_DEPTH, mode=Mode.SUBTRACT)

    # 草图38 → 切除-拉伸55 (cut)
    with BuildSketch(Plane(origin=(0, 0, 14.5), x_dir=(-1, 0, 0), z_dir=(0, 0, -1)).offset(CUT_EXTRUDE_START_2)):
        with BuildLine():
            Line((-28.118790882, 69.728664331), (-33.07774272, 67.319017634))
            ThreePointArc((-33.07774272, 67.319017634), (-29.107641849, 67.49242182), (-26.264970905, 64.715554549))
            ThreePointArc((-26.264970905, 64.715554549), (-27.234796071, 67.206239647), (-28.118790882, 69.728664331))
        make_face()
        with BuildLine():
            ThreePointArc((-48.242841776, 54.390975085), (-48.470862659, 58.211010087), (-45.930925117, 61.073417854))
            Line((-45.930925117, 61.073417854), (-50.428104831, 58.888154799))
            Line((-50.428104831, 58.888154799), (-48.242841776, 54.390975085))
        make_face()
    extrude(amount=CUT_EXTRUDE_55_DEPTH, mode=Mode.SUBTRACT)

    # 草图39 → 切除-拉伸56 (cut)
    with BuildSketch(Plane(origin=(0, 0, 15), x_dir=(-1, 0, 0), z_dir=(0, 0, -1))):
        Polygon((48.242841776, 54.390975085), (26.264970905, 64.715554549), (26.264970905, 71.368116994), (43.745662062, 64.715554549), (54.453178614, 55.789663045), align=None)
    extrude(amount=-CUT_EXTRUDE_56_DEPTH, mode=Mode.SUBTRACT)

    # 草图40 → 切除-拉伸59 (cut)
    with BuildSketch(Plane(origin=(0, 0, 15), x_dir=(-1, 0, 0), z_dir=(0, 0, -1)).offset(CUT_EXTRUDE_START_2)):
        with BuildLine():
            ThreePointArc((43.654966399, 56.544172545), (46.244717147, 53.684534957), (46.027848977, 49.832612805))
            Line((46.027848977, 49.832612805), (48.242841776, 54.390975085))
            Line((48.242841776, 54.390975085), (26.264970905, 64.715554549))
            ThreePointArc((26.264970905, 64.715554549), (25.292309142, 62.442144189), (24.248135755, 60.200678708))
            ThreePointArc((24.248135755, 60.200678708), (27.078564785, 62.731405098), (30.870769912, 62.544095633))
            Line((30.870769912, 62.544095633), (43.654966399, 56.544172545))
        make_face()
    extrude(amount=CUT_EXTRUDE_59_DEPTH, mode=Mode.SUBTRACT)

    # 草图41 → 切除-拉伸60 (cut)
    with BuildSketch(Plane(origin=(0, 0, 14.5), x_dir=(-1, 0, 0), z_dir=(0, 0, -1))):
        Polygon((-48.242841776, -54.390975085), (-26.264970905, -64.715554549), (-33.307203091, -81.924037924), (-55.077325326, -68.939499551), (-59.769437842, -58.193271975), align=None)
    extrude(amount=-CUT_EXTRUDE_60_DEPTH, mode=Mode.SUBTRACT)

    # 草图42 → 切除-拉伸61 (cut)
    with BuildSketch(Plane(origin=(0, 0, 14.5), x_dir=(-1, 0, 0), z_dir=(0, 0, -1)).offset(CUT_EXTRUDE_START_2)):
        with BuildLine():
            Line((-48.242841776, -54.390975085), (-43.657441558, -56.545065861))
            ThreePointArc((-43.657441558, -56.545065861), (-46.245836324, -53.685343094), (-46.028662238, -49.834286462))
            Line((-46.028662238, -49.834286462), (-48.242841776, -54.390975085))
        make_face()
        with BuildLine():
            ThreePointArc((-24.25102678, -60.206636989), (-27.082306467, -62.737980421), (-30.875507996, -62.549655184))
            Line((-30.875507996, -62.549655184), (-26.264970905, -64.715554549))
            ThreePointArc((-26.264970905, -64.715554549), (-25.293659643, -62.445167587), (-24.25102678, -60.206636989))
        make_face()
    extrude(amount=CUT_EXTRUDE_61_DEPTH, mode=Mode.SUBTRACT)

    # 草图43 → 切除-拉伸62 (cut)
    with BuildSketch(Plane(origin=(0, 0, 14.5), x_dir=(-1, 0, 0), z_dir=(0, 0, -1))):
        Polygon((48.242841776, -54.390975085), (26.264970905, -64.715554549), (26.264970905, -68.825223873), (37.25390634, -68.825223873), (50.755702933, -62.482463347), (52.393430427, -53.453956599), align=None)
    extrude(amount=-CUT_EXTRUDE_62_DEPTH, mode=Mode.SUBTRACT)

    # 草图44 → 切除-拉伸63 (cut)
    with BuildSketch(Plane(origin=(0, 0, 14.5), x_dir=(-1, 0, 0), z_dir=(0, 0, -1)).offset(CUT_EXTRUDE_START_2)):
        with BuildLine():
            Line((26.264970905, -64.715554549), (30.875507996, -62.549655184))
            ThreePointArc((30.875507996, -62.549655184), (27.082306467, -62.737980421), (24.25102678, -60.206636989))
            ThreePointArc((24.25102678, -60.206636989), (25.293659643, -62.445167587), (26.264970905, -64.715554549))
        make_face()
        with BuildLine():
            ThreePointArc((46.028662238, -49.834286462), (46.245836324, -53.685343094), (43.657441558, -56.545065861))
            Line((43.657441558, -56.545065861), (48.242841776, -54.390975085))
            Line((48.242841776, -54.390975085), (46.028662238, -49.834286462))
        make_face()
    extrude(amount=CUT_EXTRUDE_63_DEPTH, mode=Mode.SUBTRACT)


solid = part.part
